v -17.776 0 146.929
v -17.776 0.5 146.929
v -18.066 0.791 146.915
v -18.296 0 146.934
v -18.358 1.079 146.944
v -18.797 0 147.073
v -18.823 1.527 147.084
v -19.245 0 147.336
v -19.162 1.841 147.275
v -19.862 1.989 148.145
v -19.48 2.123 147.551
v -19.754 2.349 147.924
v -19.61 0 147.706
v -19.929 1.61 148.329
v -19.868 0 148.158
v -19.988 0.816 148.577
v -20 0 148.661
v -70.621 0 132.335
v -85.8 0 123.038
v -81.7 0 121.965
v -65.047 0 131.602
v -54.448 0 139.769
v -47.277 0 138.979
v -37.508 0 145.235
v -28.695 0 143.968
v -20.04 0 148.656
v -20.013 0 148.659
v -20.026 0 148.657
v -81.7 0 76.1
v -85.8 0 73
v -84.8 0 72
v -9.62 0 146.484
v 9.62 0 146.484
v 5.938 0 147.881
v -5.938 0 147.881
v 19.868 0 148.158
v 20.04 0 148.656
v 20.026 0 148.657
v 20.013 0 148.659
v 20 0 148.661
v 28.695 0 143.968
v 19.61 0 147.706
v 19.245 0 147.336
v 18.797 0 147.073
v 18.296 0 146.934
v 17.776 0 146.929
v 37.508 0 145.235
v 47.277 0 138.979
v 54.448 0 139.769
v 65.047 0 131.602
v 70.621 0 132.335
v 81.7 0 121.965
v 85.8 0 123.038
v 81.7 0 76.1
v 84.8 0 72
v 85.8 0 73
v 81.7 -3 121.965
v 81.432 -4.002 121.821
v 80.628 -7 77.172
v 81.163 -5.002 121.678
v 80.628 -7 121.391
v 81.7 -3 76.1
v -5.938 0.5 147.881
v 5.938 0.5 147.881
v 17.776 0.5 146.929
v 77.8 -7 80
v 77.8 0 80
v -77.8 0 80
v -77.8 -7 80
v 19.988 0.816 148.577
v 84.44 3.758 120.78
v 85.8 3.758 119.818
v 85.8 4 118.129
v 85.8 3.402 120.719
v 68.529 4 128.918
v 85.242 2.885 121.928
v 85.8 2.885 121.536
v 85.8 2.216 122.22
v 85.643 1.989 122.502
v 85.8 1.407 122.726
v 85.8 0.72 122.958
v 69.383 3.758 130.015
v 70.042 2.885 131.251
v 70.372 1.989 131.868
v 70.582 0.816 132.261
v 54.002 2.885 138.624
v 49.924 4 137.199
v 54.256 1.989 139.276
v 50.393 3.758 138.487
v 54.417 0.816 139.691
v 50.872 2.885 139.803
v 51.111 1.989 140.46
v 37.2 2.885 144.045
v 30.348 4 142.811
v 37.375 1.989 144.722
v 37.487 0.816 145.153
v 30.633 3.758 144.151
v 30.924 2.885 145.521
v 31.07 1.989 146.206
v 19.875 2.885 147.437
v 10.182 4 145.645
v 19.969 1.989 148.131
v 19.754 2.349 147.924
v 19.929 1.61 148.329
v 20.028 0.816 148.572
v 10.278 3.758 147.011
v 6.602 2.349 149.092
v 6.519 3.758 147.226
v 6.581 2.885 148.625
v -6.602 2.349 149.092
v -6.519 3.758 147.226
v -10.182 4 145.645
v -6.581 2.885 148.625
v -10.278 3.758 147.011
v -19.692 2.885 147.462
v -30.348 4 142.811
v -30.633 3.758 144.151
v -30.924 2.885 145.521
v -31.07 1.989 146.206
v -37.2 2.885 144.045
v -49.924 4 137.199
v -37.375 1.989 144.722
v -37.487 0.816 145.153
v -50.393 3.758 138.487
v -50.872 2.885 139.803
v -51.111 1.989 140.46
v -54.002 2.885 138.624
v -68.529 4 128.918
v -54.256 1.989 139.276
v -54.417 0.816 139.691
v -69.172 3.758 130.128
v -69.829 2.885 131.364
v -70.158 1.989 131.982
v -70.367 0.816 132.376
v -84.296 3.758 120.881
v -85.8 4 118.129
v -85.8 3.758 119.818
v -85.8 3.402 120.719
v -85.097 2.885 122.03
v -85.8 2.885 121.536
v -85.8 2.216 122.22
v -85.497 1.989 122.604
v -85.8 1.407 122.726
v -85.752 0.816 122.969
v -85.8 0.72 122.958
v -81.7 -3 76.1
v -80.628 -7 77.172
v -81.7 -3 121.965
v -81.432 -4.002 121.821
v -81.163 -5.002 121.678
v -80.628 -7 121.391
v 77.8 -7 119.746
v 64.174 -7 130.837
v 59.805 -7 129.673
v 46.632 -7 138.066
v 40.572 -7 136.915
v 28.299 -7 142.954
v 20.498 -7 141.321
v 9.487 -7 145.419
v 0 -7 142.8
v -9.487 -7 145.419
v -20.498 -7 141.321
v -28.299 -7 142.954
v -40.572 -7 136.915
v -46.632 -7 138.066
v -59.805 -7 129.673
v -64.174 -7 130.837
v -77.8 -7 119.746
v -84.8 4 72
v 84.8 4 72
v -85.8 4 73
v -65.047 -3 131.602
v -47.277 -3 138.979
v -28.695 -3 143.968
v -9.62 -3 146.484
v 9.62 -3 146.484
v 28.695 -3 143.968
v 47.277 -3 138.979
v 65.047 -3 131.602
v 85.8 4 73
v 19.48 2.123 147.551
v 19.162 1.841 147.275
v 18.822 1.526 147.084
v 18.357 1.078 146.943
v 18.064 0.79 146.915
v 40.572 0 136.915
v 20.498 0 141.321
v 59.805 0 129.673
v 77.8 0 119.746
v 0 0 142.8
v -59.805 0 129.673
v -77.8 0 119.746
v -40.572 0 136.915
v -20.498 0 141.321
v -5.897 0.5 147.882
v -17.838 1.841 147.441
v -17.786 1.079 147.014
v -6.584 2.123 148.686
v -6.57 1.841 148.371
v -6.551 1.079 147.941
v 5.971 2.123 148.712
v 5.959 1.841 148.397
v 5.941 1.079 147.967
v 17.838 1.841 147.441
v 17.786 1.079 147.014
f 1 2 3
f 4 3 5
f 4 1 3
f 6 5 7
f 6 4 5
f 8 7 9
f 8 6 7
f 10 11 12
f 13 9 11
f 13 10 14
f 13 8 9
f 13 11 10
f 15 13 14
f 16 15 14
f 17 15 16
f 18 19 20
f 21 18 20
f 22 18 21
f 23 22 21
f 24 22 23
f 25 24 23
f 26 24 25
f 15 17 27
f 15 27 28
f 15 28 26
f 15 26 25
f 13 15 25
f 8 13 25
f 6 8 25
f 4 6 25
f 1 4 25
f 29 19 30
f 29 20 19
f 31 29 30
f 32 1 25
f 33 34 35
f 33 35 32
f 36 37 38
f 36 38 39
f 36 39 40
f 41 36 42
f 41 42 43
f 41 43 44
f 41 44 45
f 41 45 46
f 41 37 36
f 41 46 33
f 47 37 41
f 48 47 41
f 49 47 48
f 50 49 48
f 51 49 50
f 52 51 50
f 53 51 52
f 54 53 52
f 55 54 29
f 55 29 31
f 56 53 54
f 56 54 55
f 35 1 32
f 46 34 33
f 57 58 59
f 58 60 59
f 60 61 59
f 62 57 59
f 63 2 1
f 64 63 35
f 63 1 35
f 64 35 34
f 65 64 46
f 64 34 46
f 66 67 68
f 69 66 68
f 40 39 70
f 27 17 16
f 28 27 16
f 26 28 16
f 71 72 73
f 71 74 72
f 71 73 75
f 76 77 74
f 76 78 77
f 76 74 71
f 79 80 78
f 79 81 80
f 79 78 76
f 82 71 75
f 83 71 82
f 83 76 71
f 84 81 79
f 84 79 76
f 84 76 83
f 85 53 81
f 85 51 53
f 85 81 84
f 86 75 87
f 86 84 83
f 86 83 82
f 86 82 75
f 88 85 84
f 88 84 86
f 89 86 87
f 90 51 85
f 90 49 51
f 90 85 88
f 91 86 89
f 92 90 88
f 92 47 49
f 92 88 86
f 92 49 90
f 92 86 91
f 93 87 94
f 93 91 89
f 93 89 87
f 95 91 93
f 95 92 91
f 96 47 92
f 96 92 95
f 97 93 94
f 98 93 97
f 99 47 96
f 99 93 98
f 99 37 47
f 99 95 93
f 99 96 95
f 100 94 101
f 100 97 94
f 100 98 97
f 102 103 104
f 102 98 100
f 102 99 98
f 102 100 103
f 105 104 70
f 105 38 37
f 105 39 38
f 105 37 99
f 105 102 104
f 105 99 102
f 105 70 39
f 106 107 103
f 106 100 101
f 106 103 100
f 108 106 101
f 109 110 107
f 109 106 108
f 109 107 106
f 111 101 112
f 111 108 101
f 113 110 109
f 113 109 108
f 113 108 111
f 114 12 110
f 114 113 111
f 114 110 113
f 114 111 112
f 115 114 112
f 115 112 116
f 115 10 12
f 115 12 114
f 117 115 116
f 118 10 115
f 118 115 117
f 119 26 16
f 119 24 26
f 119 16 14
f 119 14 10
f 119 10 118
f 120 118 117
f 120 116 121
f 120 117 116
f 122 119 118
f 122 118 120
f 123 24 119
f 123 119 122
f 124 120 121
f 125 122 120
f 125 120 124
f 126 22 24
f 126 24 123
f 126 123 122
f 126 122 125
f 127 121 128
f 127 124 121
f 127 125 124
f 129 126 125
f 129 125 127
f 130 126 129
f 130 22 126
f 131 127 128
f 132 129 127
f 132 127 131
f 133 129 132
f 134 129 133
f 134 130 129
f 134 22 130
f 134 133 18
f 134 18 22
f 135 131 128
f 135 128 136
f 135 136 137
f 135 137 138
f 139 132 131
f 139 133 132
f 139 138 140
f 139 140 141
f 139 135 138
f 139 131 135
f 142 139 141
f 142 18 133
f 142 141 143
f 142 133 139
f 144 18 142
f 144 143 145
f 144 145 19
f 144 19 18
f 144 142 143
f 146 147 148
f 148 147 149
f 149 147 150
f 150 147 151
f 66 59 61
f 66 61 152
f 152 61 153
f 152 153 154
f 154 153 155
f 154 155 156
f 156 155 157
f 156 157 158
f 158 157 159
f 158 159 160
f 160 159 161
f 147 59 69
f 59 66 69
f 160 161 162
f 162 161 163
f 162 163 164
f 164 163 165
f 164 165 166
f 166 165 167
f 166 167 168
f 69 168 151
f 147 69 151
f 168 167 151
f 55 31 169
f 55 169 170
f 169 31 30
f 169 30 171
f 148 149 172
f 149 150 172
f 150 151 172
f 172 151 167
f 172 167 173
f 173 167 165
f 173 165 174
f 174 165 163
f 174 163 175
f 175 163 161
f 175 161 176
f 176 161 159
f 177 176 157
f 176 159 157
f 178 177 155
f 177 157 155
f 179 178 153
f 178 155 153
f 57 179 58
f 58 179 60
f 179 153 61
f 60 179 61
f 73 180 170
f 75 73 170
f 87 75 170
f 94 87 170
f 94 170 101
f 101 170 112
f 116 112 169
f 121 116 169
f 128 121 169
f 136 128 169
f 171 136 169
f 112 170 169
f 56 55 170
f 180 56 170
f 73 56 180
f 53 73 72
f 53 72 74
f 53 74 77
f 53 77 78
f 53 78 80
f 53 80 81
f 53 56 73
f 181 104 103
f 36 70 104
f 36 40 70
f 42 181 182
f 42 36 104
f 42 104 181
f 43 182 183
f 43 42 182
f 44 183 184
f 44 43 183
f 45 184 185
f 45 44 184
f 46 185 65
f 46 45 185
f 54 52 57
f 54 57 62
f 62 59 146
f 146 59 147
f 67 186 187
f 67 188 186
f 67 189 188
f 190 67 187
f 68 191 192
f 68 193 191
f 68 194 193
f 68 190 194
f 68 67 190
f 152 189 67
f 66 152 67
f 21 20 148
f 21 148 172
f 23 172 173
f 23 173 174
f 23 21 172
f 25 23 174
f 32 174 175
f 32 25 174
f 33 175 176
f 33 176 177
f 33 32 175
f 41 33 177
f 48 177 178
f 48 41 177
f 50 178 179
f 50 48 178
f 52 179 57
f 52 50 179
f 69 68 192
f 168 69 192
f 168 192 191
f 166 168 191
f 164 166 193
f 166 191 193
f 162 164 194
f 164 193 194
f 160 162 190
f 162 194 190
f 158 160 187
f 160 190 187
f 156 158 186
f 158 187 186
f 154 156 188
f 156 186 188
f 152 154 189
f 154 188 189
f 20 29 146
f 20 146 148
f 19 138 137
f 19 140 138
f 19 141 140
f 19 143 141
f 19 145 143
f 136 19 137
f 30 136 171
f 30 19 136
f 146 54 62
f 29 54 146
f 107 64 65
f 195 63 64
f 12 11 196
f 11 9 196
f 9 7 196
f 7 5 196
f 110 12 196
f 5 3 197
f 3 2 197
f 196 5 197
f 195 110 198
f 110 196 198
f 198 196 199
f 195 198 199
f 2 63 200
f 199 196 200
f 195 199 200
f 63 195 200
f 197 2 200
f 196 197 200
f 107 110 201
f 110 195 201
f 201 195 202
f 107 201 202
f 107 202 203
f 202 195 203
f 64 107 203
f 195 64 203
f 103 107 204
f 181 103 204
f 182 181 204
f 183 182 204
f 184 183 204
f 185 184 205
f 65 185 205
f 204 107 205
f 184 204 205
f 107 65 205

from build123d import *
from OCP.BRepFilletAPI import BRepFilletAPI_MakeChamfer

# Parameters (mm, degrees)
EXTRUDE_1_DEPTH     = 4
CHAMFER_1_SIZE      = 1
EXTRUDE_2_DEPTH     = 7
CHAMFER_2_SIZE      = 4
CHAMFER_2_SIZE2     = 1.07179677
CUT_EXTRUDE_1_DEPTH = 2.5
FILLET_1_R          = 2
FILLET_2_R          = 4


with BuildPart() as part:
    # 스케치1 → 보스-돌출1 (new body)
    with BuildSketch(Plane(origin=(0, 0, 0), x_dir=(1, 0, 0), z_dir=(0, 1, 0))):
        with BuildLine():
            Line((85.8, -72), (85.8, -123.038042897))
            ThreePointArc((85.8, -123.038042897), (0, -150), (-85.8, -123.038042897))
            Line((-85.8, -123.038042897), (-85.8, -72))
            Line((-85.8, -72), (85.8, -72))
        make_face()
    extrude(amount=EXTRUDE_1_DEPTH)

    # 모따기1
    chamfer_1_edges = [part.edges().sort_by_distance(p)[0] for p in [
        (85.8, 2, 72),
        (-85.8, 2, 72),
    ]]
    chamfer(chamfer_1_edges, length=CHAMFER_1_SIZE)

    # 스케치2 → 보스-돌출2 (add)
    with BuildSketch(Plane.XZ):
        with BuildLine():
            Line((-81.7, 76.1), (-81.7, 121.964544028))
            ThreePointArc((-81.7, 121.964544028), (0, 146.8), (81.7, 121.964544028))
            Line((81.7, 121.964544028), (81.7, 76.1))
            Line((81.7, 76.1), (-81.7, 76.1))
        make_face()
        with BuildLine():
            Line((-77.8, 80), (-77.8, 119.745563592))
            ThreePointArc((-77.8, 119.745563592), (0, 142.8), (77.8, 119.745563592))
            Line((77.8, 119.745563592), (77.8, 80))
            Line((77.8, 80), (-77.8, 80))
        make_face(mode=Mode.SUBTRACT)
    extrude(amount=EXTRUDE_2_DEPTH)

    # 모따기2: one chamfer whose edges measure the first distance from different faces: ONE call of the kernel's chamfer builder (chamfer() names one face for all edges)
    chamfer_2_edges_1 = [part.edges().sort_by_distance(p)[0] for p in [
        (0, -7, 146.8),
    ]]
    chamfer_2_side_1 = [part.faces().sort_by_distance(p)[0] for p in [
        (0, -3.5, 146.8),
    ]]
    chamfer_2_edges_2 = [part.edges().sort_by_distance(p)[0] for p in [
        (-81.7, -7, 99.032272014),
    ]]
    chamfer_2_side_2 = [part.faces().sort_by_distance(p)[0] for p in [
        (-81.7, -3.5, 99.032272014),
    ]]
    chamfer_2_edges_3 = [part.edges().sort_by_distance(p)[0] for p in [
        (0, -7, 76.1),
    ]]
    chamfer_2_side_3 = [part.faces().sort_by_distance(p)[0] for p in [
        (0, -3.5, 76.1),
    ]]
    chamfer_2_edges_4 = [part.edges().sort_by_distance(p)[0] for p in [
        (81.7, -7, 99.032272014),
    ]]
    chamfer_2_side_4 = [part.faces().sort_by_distance(p)[0] for p in [
        (81.7, -3.5, 99.032272014),
    ]]
    chamfer_2 = BRepFilletAPI_MakeChamfer(part.part.solid().wrapped)
    for e in chamfer_2_edges_1:
        chamfer_2.Add(CHAMFER_2_SIZE, CHAMFER_2_SIZE2, e.wrapped, chamfer_2_side_1[0].wrapped)  # the first distance lies on this face
    for e in chamfer_2_edges_2:
        chamfer_2.Add(CHAMFER_2_SIZE, CHAMFER_2_SIZE2, e.wrapped, chamfer_2_side_2[0].wrapped)  # the first distance lies on this face
    for e in chamfer_2_edges_3:
        chamfer_2.Add(CHAMFER_2_SIZE, CHAMFER_2_SIZE2, e.wrapped, chamfer_2_side_3[0].wrapped)  # the first distance lies on this face
    for e in chamfer_2_edges_4:
        chamfer_2.Add(CHAMFER_2_SIZE, CHAMFER_2_SIZE2, e.wrapped, chamfer_2_side_4[0].wrapped)  # the first distance lies on this face
    add(Compound.cast(chamfer_2.Shape()), mode=Mode.REPLACE)

    # 스케치3 → 컷-돌출1 (cut)
    with BuildSketch(Plane.XZ):
        with BuildLine():
            Line((20, 146.642422239), (20, 148.660687473))
            ThreePointArc((20, 148.660687473), (0, 150), (-20, 148.660687473))
            Line((-20, 148.660687473), (-20, 146.642422239))
            ThreePointArc((-20, 146.642422239), (0, 148), (20, 146.642422239))
        make_face()
    extrude(amount=-CUT_EXTRUDE_1_DEPTH, mode=Mode.SUBTRACT)

    # 필렛1
    # the kernel refuses this fillet: 2 mm, written as the material it adds along each edge
    with BuildSketch(Plane(origin=(20, 0, 146.642422239), x_dir=(-0.991822496989378, 0, 0.12762497586975344), z_dir=(0, 1, 0))) as fillet_1_piece_1:
        with BuildLine():
            CenterArc((2.257580225, 1.999942607), FILLET_1_R, 179.947910746, 89.618025307)
            Line((0.257581052, 2.001760865), (0.217581068, 2.00179723))
            ThreePointArc((0.217581068, 2.00179723), (0.089117626, 1.005985431), (-0.0396729, 0.005104999))
            Line((-0.0396729, 0.005104999), (0.000303031, -0.039998852))
            ThreePointArc((0.000303031, -0.039998852), (1.12121434, -0.035752907), (2.242125649, -0.039998852))
            Line((2.242125649, -0.039998852), (2.24242868, 0))
        make_face()
    extrude(amount=2.5)
    with BuildSketch(Plane(origin=(-20, 0, 146.642422239), x_dir=(0, 0, 1), z_dir=(0, 1, 0))) as fillet_1_piece_2:
        with BuildLine():
            CenterArc((2.271711692, 1.983876229), FILLET_1_R, 173.101693725, 89.618025307)
            Line((0.286189906, 2.224091213), (0.24647947, 2.228895513))
            ThreePointArc((0.24647947, 2.228895513), (0.107634416, 1.11660857), (-0.039633087, 0.005405405))
            Line((-0.039633087, 0.005405405), (0, -0.04))
            ThreePointArc((0, -0.04), (1.009132617, -0.04), (2.013196305, -0.039677525))
            Line((2.013196305, -0.039677525), (2.018265235, 0))
        make_face()
    extrude(amount=2.5)
    with BuildSketch(Plane(origin=(0, 2.5, 0), x_dir=(-0.16852594692662803, 0, 0.9856972178171568), z_dir=(-0.9856972178171568, 0, -0.16852594692662803))) as fillet_1_piece_3:
        with BuildLine():
            CenterArc((148 + FILLET_1_R, -FILLET_1_R), FILLET_1_R, 90, 90)
            Line((148 + FILLET_1_R, 0), (148 + FILLET_1_R, FILLET_1_R * 0.02))
            Line((148 + FILLET_1_R, FILLET_1_R * 0.02), (148 - FILLET_1_R * 0.02, FILLET_1_R * 0.02))
            Line((148 - FILLET_1_R * 0.02, FILLET_1_R * 0.02), (148 - FILLET_1_R * 0.02, -FILLET_1_R))
            Line((148 - FILLET_1_R * 0.02, -FILLET_1_R), (148, -FILLET_1_R))
        make_face()
    revolve(axis=Axis((0, 2.5, 0), (0, 1, 0)), revolution_arc=19.4042511)

    # 필렛2
    # the kernel refuses this fillet: 4 mm, written as the material it takes off along each edge
    with BuildSketch(Plane(origin=(0, 4, 0), x_dir=(0.6253849976440692, 0, 0.7803163491313813), z_dir=(0.7803163491313813, 0, -0.6253849976440692))) as fillet_2_piece_1_section:
        with BuildLine():
            CenterArc((150 - FILLET_2_R, FILLET_2_R), FILLET_2_R, 270, 90)
            Line((150 - FILLET_2_R, 0), (150 - FILLET_2_R, -FILLET_2_R * 0.02))
            Line((150 - FILLET_2_R, -FILLET_2_R * 0.02), (150 + FILLET_2_R * 0.02, -FILLET_2_R * 0.02))
            Line((150 + FILLET_2_R * 0.02, -FILLET_2_R * 0.02), (150 + FILLET_2_R * 0.02, FILLET_2_R))
            Line((150 + FILLET_2_R * 0.02, FILLET_2_R), (150, FILLET_2_R))
        make_face()
    fillet_2_piece_1 = revolve(axis=Axis((0, 4, 0), (0, -1, 0)), revolution_arc=77.420901677, mode=Mode.PRIVATE)
    fillet_2_piece_1 = split(fillet_2_piece_1, bisect_by=Plane(origin=(85.8, 2.892558324, 148.892558324), z_dir=(-1, 0, 0)), keep=Keep.TOP, mode=Mode.PRIVATE)
    fillet_2_piece_1 = split(fillet_2_piece_1, bisect_by=Plane(origin=(-85.8, 2.892558324, 148.892558324), z_dir=(1, 0, 0)), keep=Keep.TOP, mode=Mode.PRIVATE)
    add(fillet_2_piece_1, mode=Mode.SUBTRACT)


solid = part.part
